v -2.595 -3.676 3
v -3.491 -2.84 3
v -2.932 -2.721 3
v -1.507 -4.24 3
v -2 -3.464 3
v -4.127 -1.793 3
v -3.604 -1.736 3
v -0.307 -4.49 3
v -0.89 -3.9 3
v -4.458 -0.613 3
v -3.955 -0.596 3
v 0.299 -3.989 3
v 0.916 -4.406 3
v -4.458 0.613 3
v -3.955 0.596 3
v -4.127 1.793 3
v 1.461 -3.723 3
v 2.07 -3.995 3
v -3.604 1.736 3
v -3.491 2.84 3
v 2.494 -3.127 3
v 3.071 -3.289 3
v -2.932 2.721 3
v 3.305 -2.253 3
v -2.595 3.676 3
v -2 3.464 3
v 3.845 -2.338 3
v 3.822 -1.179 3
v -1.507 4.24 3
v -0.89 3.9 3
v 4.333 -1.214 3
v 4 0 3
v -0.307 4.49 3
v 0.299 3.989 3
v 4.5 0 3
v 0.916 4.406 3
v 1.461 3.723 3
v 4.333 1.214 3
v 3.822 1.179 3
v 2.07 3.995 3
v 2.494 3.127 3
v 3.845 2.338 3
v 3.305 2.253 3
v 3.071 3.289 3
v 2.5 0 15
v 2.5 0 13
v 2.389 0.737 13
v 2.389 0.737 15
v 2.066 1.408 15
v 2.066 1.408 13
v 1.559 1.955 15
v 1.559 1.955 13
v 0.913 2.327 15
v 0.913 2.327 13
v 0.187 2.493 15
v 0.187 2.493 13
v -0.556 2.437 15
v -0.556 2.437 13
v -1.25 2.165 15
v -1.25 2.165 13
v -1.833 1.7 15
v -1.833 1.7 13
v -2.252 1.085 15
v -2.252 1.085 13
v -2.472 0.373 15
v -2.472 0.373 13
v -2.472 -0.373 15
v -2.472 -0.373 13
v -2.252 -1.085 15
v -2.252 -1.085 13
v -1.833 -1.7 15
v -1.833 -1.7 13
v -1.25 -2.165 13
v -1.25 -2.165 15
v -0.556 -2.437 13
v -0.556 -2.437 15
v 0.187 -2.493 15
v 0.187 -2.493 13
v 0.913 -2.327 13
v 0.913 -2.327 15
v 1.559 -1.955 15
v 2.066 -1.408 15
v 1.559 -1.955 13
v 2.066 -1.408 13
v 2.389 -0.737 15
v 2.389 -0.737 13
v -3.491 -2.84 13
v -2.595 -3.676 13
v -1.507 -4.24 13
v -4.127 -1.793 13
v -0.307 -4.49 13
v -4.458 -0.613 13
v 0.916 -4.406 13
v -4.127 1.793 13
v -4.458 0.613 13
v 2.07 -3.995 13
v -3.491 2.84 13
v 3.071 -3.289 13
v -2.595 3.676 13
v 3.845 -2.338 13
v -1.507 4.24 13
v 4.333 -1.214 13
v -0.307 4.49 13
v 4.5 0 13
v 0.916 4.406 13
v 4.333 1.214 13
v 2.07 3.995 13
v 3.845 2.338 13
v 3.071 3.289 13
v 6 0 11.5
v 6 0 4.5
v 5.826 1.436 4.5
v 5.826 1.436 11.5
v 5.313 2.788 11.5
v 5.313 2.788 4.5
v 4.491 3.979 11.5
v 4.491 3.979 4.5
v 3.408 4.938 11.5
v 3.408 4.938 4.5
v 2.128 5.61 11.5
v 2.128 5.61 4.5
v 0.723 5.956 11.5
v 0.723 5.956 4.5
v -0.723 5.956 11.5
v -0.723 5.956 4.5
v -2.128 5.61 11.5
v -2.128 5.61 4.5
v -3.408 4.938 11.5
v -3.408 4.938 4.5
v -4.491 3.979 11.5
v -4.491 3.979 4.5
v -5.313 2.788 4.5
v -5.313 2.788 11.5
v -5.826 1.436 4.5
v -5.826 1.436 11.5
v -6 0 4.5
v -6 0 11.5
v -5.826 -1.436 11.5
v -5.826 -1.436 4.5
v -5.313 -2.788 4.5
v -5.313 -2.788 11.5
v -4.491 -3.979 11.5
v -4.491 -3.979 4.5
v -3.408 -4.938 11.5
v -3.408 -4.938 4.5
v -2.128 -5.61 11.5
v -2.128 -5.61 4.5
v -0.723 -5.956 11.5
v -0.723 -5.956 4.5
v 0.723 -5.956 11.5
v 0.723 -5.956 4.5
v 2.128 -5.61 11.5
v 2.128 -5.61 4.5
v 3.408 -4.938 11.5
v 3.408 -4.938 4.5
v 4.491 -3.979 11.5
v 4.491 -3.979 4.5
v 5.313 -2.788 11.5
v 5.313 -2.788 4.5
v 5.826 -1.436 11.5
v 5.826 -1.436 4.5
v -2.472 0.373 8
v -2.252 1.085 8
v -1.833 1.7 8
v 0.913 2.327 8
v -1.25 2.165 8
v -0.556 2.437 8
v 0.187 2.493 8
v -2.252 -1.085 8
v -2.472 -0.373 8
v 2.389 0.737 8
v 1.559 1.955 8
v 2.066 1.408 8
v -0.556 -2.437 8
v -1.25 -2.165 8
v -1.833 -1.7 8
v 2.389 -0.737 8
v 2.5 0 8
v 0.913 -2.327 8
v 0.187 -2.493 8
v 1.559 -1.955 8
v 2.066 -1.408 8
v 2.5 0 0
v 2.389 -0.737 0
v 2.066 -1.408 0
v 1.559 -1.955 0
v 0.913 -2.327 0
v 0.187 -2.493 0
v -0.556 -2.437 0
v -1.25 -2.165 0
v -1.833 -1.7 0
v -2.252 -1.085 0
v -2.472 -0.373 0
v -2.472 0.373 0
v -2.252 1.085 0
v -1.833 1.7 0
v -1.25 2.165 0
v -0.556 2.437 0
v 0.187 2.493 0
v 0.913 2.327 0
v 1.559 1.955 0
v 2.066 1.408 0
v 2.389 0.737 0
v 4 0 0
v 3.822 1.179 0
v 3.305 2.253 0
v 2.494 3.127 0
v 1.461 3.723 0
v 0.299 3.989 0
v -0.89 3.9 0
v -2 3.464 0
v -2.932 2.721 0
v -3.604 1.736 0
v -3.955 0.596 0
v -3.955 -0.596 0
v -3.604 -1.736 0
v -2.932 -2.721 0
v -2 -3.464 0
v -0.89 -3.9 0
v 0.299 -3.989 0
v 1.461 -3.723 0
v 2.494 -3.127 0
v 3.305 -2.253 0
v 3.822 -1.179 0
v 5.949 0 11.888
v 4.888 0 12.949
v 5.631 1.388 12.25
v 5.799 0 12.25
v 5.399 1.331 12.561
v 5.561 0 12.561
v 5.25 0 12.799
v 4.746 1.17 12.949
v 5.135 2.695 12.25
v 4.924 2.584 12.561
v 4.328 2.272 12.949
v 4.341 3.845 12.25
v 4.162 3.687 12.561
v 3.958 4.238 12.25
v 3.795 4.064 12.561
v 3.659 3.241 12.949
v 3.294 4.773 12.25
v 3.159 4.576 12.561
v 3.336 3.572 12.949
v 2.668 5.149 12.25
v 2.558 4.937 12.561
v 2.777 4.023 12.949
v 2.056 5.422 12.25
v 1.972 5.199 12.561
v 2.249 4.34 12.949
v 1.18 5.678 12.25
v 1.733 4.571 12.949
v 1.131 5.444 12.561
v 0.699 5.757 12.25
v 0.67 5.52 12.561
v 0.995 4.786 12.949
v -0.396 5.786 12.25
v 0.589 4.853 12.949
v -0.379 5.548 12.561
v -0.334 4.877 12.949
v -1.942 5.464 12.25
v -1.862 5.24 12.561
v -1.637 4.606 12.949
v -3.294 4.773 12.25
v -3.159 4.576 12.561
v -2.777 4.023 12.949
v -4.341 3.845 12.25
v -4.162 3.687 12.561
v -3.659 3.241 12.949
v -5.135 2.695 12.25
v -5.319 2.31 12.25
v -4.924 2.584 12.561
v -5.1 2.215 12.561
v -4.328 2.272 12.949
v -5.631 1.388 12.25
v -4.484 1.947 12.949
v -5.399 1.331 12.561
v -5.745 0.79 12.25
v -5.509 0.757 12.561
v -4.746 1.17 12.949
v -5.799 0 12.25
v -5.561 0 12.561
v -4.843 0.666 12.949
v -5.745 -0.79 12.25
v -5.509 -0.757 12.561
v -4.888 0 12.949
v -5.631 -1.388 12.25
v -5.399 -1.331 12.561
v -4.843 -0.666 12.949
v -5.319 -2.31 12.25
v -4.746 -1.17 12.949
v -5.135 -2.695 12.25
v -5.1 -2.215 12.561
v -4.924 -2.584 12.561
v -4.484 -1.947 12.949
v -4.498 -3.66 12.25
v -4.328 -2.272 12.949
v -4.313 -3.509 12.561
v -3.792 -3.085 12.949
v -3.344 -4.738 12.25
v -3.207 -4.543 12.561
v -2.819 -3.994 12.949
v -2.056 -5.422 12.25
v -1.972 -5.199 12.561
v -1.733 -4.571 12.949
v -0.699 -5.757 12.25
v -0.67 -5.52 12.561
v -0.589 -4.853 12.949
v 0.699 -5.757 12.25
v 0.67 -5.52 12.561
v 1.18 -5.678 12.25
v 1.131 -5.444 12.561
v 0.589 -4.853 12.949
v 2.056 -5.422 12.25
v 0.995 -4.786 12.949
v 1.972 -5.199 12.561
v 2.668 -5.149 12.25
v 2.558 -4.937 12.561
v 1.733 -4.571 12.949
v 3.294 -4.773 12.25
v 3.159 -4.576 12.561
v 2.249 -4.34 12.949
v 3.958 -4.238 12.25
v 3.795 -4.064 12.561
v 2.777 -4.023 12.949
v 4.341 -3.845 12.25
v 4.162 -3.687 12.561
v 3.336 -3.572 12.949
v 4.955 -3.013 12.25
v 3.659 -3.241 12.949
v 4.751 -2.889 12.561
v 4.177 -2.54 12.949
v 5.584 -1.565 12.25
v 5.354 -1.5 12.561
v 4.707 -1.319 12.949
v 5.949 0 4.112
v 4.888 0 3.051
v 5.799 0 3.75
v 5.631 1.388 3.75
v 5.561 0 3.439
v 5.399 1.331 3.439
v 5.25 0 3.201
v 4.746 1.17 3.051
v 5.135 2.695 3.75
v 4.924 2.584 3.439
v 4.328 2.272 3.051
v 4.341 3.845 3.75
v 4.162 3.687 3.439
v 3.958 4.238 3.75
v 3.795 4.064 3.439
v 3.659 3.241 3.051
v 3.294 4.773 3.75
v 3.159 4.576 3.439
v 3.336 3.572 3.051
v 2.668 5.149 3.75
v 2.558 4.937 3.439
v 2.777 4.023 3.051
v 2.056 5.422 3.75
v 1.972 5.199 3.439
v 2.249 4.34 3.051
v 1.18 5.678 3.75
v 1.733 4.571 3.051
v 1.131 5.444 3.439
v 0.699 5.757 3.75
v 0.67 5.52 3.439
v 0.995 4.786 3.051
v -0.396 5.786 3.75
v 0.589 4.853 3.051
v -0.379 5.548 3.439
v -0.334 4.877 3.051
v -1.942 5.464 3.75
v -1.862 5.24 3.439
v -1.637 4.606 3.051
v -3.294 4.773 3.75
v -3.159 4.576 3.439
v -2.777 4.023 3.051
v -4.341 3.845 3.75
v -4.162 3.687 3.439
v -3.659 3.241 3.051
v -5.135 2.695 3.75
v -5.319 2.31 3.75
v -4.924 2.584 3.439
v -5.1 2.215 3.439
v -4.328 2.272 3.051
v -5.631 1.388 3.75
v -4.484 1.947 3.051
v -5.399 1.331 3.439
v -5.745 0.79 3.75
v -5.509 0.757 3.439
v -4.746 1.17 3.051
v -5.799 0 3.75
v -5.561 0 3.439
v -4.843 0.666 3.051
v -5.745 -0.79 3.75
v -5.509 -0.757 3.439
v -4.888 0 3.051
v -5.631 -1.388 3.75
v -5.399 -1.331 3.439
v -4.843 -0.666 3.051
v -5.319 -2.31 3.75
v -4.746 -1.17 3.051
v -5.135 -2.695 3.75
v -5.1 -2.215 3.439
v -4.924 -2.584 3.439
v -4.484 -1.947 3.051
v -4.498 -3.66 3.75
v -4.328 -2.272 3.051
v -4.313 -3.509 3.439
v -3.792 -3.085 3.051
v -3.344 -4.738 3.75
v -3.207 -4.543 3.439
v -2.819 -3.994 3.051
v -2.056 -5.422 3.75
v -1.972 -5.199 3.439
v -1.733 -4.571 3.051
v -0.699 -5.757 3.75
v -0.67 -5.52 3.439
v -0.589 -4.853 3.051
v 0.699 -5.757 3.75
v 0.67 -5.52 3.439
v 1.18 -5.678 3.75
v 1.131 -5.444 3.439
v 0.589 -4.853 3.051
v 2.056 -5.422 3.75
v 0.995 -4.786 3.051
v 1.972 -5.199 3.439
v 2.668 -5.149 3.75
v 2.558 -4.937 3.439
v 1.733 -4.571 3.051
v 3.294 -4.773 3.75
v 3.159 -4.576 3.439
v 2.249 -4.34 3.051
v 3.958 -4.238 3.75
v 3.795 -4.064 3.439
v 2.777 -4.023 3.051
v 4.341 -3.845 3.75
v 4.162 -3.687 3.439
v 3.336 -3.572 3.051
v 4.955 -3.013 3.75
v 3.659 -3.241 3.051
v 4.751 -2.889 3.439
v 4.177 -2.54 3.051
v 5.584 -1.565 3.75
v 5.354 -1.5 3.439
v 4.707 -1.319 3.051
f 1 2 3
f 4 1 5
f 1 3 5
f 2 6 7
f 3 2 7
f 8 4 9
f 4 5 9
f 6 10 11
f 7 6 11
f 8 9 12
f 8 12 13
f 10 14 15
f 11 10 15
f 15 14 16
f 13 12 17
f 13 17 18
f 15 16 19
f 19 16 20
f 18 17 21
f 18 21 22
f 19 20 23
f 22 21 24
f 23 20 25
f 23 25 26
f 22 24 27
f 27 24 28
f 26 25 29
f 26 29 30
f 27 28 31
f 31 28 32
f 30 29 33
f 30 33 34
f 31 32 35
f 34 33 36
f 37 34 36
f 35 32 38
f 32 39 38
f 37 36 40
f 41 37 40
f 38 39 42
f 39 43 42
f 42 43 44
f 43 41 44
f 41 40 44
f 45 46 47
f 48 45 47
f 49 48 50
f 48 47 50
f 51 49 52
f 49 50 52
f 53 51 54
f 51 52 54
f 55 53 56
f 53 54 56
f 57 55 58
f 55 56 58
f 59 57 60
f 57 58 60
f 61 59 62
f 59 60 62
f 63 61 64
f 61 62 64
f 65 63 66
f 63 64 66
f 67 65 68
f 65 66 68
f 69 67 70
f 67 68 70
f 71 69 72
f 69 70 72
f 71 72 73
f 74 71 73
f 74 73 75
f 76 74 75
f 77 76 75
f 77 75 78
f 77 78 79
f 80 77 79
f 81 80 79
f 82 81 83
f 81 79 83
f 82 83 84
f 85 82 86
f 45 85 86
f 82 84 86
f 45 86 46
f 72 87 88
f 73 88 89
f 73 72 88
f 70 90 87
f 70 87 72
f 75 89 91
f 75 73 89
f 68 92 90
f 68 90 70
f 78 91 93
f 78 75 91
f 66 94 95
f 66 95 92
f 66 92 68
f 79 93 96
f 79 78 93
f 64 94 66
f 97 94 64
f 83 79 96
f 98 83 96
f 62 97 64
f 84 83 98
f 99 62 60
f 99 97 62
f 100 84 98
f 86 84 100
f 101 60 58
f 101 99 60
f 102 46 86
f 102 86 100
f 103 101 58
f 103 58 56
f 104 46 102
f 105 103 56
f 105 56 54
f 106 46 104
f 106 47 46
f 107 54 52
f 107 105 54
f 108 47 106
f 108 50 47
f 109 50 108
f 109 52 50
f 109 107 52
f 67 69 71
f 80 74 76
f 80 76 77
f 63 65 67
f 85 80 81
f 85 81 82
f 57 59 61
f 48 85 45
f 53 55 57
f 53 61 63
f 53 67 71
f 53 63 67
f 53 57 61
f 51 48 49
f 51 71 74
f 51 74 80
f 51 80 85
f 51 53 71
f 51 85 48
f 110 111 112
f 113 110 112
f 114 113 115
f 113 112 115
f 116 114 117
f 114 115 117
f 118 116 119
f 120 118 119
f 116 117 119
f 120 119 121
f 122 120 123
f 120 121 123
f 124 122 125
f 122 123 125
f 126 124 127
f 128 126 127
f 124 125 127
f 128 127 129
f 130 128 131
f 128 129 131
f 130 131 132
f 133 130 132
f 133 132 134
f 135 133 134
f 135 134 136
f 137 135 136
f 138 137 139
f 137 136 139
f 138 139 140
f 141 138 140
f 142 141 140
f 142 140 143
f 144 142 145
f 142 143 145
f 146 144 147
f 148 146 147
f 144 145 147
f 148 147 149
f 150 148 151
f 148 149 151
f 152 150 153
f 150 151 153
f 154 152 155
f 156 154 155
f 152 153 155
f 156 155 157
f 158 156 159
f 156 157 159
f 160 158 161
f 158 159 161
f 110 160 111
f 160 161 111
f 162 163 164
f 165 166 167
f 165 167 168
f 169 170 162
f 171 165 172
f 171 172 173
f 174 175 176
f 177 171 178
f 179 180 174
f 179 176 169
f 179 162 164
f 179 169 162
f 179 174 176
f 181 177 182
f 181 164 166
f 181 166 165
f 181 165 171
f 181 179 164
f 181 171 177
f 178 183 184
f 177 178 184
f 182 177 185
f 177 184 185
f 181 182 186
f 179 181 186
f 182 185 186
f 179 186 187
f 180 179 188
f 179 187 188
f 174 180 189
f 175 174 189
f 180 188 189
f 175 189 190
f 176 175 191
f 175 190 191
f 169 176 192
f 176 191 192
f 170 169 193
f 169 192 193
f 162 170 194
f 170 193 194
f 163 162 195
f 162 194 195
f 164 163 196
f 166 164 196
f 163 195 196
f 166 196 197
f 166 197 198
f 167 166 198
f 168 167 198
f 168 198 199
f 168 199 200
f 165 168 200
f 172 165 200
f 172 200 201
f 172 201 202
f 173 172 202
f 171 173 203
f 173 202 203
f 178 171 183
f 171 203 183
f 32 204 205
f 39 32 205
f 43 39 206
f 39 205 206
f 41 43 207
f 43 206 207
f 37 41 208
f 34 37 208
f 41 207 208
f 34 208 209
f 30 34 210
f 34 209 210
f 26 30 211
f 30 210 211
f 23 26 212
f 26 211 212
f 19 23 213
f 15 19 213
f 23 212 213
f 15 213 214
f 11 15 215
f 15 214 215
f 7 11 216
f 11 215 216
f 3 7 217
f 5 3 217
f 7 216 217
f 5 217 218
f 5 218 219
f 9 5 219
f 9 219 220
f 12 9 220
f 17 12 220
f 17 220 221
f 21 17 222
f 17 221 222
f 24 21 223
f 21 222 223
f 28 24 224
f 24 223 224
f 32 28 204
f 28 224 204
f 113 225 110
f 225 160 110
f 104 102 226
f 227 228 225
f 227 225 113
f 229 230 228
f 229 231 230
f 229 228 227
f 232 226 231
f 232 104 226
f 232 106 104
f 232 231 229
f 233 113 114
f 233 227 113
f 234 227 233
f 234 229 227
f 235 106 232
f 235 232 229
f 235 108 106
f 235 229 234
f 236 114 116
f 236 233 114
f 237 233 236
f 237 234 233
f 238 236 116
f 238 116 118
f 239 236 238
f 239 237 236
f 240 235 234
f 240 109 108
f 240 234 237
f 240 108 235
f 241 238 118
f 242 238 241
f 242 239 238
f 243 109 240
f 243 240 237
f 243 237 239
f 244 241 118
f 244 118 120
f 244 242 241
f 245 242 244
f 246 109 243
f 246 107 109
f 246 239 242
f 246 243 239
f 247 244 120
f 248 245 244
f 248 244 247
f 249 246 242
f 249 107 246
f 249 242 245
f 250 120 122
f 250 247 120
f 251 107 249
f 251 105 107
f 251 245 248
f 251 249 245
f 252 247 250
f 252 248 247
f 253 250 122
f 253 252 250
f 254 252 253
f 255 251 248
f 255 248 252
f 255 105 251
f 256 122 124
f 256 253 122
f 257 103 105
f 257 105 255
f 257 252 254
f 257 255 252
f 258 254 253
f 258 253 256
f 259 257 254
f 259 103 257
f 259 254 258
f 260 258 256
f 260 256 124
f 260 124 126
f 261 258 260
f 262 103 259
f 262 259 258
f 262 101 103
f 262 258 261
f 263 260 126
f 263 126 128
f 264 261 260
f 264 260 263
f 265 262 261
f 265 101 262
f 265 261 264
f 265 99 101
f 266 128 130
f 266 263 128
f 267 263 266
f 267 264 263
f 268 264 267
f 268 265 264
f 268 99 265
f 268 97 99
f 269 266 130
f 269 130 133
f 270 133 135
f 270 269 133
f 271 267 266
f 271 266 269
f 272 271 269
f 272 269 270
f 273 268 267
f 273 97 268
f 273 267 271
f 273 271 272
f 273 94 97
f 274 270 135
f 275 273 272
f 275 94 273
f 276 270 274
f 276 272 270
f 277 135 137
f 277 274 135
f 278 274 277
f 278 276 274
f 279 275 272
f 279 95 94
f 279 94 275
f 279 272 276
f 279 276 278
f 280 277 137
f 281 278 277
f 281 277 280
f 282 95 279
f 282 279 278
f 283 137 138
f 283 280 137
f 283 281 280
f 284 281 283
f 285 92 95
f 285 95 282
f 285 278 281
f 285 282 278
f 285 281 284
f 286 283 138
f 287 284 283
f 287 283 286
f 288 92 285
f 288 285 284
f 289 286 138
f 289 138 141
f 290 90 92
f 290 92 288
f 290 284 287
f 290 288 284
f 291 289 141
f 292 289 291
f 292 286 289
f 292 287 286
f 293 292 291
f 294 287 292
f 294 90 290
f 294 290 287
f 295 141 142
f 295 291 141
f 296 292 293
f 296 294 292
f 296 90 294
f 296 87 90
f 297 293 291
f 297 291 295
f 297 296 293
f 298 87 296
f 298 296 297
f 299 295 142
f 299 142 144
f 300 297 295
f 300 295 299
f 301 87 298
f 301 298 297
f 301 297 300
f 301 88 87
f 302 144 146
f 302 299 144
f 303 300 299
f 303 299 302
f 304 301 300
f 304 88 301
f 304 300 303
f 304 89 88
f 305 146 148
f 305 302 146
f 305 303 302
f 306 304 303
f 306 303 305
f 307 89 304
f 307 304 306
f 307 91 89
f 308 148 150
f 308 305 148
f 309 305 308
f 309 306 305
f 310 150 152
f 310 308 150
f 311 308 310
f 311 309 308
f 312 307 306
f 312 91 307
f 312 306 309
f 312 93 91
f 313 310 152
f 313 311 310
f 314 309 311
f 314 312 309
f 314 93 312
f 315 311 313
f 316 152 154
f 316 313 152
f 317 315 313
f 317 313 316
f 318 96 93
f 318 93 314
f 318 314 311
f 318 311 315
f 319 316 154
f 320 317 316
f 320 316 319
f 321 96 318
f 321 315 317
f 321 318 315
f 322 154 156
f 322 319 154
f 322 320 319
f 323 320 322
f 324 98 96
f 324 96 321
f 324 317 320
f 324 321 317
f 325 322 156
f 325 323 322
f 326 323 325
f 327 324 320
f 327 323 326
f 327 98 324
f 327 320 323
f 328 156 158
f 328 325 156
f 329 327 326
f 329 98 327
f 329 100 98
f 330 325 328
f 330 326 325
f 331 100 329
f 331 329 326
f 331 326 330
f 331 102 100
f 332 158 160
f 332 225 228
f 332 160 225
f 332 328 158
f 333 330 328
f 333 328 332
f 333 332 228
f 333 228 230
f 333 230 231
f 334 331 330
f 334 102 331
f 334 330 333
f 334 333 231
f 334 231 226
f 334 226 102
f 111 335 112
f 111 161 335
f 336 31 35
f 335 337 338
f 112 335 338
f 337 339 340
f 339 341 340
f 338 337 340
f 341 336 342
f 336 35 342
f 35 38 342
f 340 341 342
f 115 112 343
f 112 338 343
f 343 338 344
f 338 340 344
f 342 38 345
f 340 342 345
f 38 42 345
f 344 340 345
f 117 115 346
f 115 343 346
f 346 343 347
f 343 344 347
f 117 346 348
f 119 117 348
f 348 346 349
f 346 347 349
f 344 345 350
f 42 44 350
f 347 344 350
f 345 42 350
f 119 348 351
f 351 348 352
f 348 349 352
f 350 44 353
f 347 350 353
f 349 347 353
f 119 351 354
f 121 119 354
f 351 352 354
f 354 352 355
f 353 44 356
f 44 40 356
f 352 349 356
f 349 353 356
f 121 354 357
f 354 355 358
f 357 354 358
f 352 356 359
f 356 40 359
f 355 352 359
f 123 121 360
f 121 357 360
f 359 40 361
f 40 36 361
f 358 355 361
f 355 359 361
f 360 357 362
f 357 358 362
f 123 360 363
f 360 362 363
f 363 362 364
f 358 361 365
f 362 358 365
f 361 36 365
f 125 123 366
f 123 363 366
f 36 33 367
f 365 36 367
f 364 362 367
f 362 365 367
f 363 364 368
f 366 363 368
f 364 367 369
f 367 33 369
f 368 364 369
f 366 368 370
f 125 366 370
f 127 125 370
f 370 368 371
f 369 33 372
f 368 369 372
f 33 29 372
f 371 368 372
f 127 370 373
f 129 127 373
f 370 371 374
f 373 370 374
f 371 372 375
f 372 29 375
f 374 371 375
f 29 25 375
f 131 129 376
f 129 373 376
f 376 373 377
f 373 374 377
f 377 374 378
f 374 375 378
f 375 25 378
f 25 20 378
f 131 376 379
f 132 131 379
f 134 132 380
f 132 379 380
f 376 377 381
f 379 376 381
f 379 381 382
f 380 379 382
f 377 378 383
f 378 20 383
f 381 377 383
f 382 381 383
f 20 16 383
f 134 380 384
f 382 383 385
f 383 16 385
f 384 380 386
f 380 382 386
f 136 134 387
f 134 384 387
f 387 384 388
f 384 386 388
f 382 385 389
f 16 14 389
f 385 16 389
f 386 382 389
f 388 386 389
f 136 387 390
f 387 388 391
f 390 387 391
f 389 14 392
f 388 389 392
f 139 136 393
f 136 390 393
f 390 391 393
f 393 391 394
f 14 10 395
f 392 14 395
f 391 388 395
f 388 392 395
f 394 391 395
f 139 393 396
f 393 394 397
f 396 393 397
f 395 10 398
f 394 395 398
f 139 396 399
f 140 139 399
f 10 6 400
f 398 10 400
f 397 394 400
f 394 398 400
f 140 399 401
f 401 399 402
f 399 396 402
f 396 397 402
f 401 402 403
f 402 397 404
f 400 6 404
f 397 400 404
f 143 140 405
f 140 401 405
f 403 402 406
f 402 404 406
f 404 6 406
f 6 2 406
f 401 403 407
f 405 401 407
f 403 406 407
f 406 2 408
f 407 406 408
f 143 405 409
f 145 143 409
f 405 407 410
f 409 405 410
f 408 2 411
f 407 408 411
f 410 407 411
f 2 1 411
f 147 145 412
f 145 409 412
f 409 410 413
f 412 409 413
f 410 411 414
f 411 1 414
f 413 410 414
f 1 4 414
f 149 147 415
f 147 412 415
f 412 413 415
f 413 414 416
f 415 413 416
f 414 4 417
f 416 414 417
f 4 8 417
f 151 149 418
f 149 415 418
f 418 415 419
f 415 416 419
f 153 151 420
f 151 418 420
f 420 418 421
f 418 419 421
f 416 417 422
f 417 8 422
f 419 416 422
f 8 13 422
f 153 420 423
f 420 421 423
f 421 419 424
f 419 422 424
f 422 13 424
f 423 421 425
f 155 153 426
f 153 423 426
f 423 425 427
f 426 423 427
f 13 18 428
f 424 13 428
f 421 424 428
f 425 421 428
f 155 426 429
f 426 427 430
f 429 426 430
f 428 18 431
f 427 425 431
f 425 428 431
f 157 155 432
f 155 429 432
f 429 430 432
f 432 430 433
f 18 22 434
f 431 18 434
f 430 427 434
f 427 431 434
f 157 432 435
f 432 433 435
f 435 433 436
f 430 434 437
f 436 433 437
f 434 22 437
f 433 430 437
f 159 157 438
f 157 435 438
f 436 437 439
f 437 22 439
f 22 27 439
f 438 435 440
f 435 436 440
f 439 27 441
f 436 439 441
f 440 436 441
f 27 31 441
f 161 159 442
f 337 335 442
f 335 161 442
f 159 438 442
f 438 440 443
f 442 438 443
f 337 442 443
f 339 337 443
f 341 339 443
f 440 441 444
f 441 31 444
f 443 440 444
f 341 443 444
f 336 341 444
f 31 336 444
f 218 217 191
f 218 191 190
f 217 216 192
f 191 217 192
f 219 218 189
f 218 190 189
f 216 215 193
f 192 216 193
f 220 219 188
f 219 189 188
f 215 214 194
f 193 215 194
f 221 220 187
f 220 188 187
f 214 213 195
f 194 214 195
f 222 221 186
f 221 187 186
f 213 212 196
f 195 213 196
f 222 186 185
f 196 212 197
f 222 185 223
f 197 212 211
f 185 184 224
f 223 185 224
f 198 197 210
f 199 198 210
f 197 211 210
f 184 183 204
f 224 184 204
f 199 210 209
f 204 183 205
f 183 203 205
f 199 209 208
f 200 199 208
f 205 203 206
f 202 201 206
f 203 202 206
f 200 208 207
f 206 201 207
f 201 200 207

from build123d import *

# Parameters (mm, degrees)
F0_R     = 4
F1_DEPTH = 3
F2_R     = 6
F3_DEPTH = 10
F4_R     = 2.5
F5_DEPTH = 2
F6_R     = 1.5
F7_R     = 2.5
F8_DEPTH = 8


with BuildPart() as f1:
    # F0 (on Top) → F1 (new body)
    with BuildSketch(Plane.XY):
        Circle(F0_R)
    extrude(amount=F1_DEPTH)

    # F2 (on face) → F3 (join)
    with BuildSketch(Plane.XY.offset(3)):
        Circle(F2_R)
    extrude(amount=F3_DEPTH)

    # F4 (on face) → F5 (join)
    with BuildSketch(Plane.XY.offset(13)):
        Circle(F4_R)
    extrude(amount=F5_DEPTH)

    # F6
    f6_edges = [f1.edges().sort_by_distance(p)[0] for p in [
        (-6, 0, 13),
        (-6, 0, 3),
    ]]
    fillet(f6_edges, radius=F6_R)

    # F7 (on face) → F8 (cut)
    with BuildSketch(Plane(origin=(0, 0, 0), x_dir=(1, 0, 0), z_dir=(0, 0, -1))):
        Circle(F7_R)
    extrude(amount=-F8_DEPTH, mode=Mode.SUBTRACT)


solid = f1.part
